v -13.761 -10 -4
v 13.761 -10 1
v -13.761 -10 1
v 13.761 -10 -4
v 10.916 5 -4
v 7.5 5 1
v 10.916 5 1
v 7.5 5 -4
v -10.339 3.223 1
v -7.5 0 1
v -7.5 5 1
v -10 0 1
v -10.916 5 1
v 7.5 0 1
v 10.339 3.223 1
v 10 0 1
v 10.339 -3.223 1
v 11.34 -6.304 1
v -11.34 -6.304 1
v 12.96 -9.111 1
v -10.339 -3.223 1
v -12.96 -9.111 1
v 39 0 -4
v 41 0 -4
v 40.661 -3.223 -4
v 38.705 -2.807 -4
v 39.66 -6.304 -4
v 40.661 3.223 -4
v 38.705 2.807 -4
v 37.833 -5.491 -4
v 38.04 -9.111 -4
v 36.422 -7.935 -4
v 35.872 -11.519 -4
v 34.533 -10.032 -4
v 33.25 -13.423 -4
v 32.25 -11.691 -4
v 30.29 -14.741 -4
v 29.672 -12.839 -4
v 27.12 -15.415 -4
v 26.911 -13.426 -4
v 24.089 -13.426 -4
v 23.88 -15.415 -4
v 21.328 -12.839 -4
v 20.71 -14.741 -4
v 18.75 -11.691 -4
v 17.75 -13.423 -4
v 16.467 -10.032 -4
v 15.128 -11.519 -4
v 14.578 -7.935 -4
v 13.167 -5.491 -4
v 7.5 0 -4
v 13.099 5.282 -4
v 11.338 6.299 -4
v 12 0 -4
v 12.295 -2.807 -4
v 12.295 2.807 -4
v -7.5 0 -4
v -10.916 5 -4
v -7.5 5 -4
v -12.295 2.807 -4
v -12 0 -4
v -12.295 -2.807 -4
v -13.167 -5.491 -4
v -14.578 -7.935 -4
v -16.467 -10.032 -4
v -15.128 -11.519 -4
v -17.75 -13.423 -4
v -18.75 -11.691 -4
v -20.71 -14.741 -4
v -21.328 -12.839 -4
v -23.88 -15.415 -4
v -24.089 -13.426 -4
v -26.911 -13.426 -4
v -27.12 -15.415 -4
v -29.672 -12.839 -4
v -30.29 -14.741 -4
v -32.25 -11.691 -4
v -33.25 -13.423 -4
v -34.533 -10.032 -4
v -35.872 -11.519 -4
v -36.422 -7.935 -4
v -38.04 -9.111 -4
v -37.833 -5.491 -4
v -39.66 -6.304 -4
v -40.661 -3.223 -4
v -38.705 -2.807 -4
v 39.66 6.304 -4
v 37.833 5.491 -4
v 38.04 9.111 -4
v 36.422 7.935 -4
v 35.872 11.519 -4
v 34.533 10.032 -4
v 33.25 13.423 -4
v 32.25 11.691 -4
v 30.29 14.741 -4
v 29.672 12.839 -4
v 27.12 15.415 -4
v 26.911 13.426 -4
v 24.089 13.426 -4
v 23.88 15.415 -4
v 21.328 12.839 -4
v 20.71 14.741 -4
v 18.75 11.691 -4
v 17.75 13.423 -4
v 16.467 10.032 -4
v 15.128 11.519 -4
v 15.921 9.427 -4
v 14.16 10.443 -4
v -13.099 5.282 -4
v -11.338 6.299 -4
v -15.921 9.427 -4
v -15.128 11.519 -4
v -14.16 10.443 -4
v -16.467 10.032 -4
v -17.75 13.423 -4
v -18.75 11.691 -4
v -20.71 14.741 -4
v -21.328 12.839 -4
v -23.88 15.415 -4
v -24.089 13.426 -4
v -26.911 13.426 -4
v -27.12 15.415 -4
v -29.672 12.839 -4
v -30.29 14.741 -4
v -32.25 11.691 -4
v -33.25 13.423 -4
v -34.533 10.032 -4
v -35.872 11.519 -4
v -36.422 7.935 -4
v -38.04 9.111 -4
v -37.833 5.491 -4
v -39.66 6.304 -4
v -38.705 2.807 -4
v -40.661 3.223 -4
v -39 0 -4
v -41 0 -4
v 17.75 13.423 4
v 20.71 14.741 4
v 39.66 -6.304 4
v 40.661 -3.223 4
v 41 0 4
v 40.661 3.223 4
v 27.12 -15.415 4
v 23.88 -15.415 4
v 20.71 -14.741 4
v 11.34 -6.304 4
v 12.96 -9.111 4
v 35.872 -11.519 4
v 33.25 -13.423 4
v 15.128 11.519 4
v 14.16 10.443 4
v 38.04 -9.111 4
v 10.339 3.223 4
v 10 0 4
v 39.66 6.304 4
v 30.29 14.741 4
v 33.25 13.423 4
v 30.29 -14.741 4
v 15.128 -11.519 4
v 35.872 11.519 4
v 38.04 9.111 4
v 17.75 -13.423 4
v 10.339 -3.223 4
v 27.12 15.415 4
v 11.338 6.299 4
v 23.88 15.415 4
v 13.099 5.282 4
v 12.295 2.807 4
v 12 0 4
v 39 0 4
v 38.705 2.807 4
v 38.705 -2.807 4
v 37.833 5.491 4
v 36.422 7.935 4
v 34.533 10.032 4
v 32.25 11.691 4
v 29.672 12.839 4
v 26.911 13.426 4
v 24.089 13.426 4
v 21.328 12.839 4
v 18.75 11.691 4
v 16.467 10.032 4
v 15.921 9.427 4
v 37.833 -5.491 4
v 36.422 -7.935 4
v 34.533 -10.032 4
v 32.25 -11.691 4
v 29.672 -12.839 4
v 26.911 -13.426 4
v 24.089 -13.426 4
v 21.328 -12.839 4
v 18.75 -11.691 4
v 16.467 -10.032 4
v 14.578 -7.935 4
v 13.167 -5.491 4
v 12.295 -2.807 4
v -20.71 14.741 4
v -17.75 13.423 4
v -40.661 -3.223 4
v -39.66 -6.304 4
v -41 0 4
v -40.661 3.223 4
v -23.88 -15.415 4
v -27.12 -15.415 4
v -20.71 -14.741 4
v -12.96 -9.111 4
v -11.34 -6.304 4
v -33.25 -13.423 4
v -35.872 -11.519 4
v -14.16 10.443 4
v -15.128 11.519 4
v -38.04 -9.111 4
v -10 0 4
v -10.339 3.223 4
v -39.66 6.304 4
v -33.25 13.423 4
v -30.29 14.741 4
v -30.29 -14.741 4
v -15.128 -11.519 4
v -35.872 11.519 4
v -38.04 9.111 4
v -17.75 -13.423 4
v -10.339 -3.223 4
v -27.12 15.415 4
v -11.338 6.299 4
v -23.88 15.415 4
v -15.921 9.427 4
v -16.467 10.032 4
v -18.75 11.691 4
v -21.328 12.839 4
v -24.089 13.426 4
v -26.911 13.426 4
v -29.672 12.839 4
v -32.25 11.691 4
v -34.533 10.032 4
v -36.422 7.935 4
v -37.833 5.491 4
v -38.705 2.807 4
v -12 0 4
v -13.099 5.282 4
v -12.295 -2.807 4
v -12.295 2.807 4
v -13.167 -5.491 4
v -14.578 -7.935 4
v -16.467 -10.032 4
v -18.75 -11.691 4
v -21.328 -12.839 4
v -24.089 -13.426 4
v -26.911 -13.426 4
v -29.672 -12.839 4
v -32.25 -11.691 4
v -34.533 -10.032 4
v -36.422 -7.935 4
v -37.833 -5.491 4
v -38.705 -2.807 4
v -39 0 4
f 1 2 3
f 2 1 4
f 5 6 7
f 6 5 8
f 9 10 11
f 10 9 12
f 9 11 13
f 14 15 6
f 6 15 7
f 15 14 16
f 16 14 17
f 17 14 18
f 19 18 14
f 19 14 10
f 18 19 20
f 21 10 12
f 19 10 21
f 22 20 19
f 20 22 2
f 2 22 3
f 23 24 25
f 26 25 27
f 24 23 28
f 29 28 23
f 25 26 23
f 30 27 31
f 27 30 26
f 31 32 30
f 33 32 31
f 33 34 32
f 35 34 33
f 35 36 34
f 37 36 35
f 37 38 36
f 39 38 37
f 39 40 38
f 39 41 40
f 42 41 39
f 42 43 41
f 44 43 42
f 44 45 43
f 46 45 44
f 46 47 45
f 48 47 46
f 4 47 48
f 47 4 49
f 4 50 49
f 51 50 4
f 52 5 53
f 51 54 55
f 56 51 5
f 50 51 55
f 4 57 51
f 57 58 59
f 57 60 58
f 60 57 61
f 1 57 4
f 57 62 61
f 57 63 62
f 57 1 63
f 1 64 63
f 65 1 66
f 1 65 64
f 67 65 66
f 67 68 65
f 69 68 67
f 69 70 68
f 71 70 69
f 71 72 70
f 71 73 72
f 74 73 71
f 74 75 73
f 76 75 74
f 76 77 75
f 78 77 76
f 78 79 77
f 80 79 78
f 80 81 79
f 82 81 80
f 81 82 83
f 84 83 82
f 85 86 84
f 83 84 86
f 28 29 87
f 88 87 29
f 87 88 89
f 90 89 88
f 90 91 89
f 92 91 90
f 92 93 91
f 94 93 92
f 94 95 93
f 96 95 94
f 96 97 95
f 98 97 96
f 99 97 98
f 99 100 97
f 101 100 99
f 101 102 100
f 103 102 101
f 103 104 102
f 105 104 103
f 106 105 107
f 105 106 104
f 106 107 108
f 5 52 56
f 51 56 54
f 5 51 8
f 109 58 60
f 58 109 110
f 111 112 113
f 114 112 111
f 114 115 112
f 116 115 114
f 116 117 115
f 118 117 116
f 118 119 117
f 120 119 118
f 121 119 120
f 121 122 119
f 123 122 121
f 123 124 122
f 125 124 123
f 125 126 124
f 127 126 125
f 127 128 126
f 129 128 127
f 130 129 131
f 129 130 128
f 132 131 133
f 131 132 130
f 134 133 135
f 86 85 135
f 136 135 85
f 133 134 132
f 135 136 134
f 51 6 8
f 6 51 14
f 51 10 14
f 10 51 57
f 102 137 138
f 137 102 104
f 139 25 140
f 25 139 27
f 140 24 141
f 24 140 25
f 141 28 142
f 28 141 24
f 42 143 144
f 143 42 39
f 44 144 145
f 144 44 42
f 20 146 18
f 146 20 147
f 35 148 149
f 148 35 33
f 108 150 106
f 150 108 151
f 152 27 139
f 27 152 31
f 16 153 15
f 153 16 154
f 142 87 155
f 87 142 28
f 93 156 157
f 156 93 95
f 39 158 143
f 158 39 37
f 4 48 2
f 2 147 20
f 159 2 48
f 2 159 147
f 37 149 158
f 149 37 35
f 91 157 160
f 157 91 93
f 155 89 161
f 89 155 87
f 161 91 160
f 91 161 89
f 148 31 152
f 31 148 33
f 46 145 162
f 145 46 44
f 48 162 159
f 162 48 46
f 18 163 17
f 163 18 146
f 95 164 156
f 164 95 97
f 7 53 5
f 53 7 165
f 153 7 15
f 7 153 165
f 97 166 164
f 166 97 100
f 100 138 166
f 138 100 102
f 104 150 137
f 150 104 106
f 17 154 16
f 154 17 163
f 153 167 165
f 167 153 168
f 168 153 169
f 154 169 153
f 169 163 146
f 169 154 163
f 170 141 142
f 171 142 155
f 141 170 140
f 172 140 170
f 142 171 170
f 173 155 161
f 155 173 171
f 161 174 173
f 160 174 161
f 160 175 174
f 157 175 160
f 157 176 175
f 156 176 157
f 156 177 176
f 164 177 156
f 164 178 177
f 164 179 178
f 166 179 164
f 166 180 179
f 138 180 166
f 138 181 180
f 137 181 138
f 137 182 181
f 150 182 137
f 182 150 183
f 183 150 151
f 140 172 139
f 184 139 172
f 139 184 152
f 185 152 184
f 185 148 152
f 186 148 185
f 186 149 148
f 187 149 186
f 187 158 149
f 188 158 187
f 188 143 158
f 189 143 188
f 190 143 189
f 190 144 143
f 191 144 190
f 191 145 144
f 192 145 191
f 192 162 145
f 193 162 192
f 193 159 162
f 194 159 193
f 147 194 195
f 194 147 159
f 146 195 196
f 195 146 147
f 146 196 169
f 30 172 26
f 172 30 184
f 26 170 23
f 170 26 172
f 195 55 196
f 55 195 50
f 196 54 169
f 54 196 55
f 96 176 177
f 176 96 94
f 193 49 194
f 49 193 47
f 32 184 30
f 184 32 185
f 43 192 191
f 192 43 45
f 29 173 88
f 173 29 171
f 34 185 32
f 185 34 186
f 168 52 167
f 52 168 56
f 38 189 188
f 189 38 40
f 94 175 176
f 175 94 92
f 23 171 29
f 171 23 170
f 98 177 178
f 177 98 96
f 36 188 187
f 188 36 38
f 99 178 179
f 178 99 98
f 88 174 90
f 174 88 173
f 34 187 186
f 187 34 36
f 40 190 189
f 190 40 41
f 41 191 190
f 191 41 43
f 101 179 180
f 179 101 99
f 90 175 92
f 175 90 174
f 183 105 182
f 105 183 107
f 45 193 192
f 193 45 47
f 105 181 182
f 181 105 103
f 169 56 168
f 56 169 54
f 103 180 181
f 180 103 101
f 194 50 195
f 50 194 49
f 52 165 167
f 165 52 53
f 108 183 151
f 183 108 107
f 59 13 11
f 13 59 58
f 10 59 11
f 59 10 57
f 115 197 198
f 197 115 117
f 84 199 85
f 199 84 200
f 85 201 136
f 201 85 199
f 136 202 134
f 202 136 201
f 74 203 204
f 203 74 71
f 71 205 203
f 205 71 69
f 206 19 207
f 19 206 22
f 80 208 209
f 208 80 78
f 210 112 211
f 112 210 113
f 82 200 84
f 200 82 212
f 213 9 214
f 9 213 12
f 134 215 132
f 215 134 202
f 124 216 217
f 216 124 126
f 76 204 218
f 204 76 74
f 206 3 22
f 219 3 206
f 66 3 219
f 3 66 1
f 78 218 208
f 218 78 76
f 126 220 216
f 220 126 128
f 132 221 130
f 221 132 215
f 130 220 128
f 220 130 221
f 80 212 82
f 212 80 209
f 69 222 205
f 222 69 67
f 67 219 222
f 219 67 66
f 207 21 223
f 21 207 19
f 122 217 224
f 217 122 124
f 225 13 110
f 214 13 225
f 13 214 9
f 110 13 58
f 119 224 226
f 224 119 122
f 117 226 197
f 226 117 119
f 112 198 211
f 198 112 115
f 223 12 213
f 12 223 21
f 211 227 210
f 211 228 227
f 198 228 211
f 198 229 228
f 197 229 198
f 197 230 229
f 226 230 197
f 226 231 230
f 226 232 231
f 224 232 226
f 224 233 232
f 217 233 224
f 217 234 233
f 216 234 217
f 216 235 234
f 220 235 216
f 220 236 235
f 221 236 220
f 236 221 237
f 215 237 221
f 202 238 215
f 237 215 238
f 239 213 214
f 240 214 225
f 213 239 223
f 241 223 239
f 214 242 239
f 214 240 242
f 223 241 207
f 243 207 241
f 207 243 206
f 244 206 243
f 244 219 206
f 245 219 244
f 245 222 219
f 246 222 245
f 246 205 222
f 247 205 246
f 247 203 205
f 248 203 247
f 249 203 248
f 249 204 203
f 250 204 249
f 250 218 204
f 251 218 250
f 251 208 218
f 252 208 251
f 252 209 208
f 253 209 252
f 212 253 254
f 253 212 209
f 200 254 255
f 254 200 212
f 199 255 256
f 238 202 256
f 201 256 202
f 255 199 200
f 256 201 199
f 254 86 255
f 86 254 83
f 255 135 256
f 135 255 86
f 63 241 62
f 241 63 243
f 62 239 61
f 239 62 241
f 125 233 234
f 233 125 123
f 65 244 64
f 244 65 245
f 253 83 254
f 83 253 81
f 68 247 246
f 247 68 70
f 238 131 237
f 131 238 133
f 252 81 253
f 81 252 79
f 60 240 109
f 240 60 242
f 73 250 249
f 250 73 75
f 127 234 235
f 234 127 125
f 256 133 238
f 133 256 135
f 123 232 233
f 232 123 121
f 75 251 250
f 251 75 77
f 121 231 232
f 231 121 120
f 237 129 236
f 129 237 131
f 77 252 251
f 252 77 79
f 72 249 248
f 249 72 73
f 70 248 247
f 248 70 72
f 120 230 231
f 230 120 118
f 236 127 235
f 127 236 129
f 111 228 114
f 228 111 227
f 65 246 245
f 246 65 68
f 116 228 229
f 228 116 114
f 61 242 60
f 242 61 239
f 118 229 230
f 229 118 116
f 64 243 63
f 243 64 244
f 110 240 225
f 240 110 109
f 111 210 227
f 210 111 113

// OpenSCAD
//width of the rocket pod that needs to fit in the holder. Minimum = 20 mm
width = 27;

module holder_half(w)
{
	difference(){
	union()
	{
	difference()
	{
		translate([0,-4,-5])cube([w,5,15]);
		translate([-1,-4.5,-6])cube([8.5,7,6]);
	}

	translate([w/2+12,4, 0])rotate([90,0,0])cylinder(r=w/2+2, h=8);
	}
	translate([w/2+12,5, 0])rotate([90,0,0])cylinder(r=w/2, h=10);
	translate([8,-5,-14])rotate([0,-30,0])cube([10,10,5]);
	}
}

module holder(w)
{
	holder_half(w);
	mirror([1,0,0])holder_half(w);
}

rotate([90,0,0])holder(width);
